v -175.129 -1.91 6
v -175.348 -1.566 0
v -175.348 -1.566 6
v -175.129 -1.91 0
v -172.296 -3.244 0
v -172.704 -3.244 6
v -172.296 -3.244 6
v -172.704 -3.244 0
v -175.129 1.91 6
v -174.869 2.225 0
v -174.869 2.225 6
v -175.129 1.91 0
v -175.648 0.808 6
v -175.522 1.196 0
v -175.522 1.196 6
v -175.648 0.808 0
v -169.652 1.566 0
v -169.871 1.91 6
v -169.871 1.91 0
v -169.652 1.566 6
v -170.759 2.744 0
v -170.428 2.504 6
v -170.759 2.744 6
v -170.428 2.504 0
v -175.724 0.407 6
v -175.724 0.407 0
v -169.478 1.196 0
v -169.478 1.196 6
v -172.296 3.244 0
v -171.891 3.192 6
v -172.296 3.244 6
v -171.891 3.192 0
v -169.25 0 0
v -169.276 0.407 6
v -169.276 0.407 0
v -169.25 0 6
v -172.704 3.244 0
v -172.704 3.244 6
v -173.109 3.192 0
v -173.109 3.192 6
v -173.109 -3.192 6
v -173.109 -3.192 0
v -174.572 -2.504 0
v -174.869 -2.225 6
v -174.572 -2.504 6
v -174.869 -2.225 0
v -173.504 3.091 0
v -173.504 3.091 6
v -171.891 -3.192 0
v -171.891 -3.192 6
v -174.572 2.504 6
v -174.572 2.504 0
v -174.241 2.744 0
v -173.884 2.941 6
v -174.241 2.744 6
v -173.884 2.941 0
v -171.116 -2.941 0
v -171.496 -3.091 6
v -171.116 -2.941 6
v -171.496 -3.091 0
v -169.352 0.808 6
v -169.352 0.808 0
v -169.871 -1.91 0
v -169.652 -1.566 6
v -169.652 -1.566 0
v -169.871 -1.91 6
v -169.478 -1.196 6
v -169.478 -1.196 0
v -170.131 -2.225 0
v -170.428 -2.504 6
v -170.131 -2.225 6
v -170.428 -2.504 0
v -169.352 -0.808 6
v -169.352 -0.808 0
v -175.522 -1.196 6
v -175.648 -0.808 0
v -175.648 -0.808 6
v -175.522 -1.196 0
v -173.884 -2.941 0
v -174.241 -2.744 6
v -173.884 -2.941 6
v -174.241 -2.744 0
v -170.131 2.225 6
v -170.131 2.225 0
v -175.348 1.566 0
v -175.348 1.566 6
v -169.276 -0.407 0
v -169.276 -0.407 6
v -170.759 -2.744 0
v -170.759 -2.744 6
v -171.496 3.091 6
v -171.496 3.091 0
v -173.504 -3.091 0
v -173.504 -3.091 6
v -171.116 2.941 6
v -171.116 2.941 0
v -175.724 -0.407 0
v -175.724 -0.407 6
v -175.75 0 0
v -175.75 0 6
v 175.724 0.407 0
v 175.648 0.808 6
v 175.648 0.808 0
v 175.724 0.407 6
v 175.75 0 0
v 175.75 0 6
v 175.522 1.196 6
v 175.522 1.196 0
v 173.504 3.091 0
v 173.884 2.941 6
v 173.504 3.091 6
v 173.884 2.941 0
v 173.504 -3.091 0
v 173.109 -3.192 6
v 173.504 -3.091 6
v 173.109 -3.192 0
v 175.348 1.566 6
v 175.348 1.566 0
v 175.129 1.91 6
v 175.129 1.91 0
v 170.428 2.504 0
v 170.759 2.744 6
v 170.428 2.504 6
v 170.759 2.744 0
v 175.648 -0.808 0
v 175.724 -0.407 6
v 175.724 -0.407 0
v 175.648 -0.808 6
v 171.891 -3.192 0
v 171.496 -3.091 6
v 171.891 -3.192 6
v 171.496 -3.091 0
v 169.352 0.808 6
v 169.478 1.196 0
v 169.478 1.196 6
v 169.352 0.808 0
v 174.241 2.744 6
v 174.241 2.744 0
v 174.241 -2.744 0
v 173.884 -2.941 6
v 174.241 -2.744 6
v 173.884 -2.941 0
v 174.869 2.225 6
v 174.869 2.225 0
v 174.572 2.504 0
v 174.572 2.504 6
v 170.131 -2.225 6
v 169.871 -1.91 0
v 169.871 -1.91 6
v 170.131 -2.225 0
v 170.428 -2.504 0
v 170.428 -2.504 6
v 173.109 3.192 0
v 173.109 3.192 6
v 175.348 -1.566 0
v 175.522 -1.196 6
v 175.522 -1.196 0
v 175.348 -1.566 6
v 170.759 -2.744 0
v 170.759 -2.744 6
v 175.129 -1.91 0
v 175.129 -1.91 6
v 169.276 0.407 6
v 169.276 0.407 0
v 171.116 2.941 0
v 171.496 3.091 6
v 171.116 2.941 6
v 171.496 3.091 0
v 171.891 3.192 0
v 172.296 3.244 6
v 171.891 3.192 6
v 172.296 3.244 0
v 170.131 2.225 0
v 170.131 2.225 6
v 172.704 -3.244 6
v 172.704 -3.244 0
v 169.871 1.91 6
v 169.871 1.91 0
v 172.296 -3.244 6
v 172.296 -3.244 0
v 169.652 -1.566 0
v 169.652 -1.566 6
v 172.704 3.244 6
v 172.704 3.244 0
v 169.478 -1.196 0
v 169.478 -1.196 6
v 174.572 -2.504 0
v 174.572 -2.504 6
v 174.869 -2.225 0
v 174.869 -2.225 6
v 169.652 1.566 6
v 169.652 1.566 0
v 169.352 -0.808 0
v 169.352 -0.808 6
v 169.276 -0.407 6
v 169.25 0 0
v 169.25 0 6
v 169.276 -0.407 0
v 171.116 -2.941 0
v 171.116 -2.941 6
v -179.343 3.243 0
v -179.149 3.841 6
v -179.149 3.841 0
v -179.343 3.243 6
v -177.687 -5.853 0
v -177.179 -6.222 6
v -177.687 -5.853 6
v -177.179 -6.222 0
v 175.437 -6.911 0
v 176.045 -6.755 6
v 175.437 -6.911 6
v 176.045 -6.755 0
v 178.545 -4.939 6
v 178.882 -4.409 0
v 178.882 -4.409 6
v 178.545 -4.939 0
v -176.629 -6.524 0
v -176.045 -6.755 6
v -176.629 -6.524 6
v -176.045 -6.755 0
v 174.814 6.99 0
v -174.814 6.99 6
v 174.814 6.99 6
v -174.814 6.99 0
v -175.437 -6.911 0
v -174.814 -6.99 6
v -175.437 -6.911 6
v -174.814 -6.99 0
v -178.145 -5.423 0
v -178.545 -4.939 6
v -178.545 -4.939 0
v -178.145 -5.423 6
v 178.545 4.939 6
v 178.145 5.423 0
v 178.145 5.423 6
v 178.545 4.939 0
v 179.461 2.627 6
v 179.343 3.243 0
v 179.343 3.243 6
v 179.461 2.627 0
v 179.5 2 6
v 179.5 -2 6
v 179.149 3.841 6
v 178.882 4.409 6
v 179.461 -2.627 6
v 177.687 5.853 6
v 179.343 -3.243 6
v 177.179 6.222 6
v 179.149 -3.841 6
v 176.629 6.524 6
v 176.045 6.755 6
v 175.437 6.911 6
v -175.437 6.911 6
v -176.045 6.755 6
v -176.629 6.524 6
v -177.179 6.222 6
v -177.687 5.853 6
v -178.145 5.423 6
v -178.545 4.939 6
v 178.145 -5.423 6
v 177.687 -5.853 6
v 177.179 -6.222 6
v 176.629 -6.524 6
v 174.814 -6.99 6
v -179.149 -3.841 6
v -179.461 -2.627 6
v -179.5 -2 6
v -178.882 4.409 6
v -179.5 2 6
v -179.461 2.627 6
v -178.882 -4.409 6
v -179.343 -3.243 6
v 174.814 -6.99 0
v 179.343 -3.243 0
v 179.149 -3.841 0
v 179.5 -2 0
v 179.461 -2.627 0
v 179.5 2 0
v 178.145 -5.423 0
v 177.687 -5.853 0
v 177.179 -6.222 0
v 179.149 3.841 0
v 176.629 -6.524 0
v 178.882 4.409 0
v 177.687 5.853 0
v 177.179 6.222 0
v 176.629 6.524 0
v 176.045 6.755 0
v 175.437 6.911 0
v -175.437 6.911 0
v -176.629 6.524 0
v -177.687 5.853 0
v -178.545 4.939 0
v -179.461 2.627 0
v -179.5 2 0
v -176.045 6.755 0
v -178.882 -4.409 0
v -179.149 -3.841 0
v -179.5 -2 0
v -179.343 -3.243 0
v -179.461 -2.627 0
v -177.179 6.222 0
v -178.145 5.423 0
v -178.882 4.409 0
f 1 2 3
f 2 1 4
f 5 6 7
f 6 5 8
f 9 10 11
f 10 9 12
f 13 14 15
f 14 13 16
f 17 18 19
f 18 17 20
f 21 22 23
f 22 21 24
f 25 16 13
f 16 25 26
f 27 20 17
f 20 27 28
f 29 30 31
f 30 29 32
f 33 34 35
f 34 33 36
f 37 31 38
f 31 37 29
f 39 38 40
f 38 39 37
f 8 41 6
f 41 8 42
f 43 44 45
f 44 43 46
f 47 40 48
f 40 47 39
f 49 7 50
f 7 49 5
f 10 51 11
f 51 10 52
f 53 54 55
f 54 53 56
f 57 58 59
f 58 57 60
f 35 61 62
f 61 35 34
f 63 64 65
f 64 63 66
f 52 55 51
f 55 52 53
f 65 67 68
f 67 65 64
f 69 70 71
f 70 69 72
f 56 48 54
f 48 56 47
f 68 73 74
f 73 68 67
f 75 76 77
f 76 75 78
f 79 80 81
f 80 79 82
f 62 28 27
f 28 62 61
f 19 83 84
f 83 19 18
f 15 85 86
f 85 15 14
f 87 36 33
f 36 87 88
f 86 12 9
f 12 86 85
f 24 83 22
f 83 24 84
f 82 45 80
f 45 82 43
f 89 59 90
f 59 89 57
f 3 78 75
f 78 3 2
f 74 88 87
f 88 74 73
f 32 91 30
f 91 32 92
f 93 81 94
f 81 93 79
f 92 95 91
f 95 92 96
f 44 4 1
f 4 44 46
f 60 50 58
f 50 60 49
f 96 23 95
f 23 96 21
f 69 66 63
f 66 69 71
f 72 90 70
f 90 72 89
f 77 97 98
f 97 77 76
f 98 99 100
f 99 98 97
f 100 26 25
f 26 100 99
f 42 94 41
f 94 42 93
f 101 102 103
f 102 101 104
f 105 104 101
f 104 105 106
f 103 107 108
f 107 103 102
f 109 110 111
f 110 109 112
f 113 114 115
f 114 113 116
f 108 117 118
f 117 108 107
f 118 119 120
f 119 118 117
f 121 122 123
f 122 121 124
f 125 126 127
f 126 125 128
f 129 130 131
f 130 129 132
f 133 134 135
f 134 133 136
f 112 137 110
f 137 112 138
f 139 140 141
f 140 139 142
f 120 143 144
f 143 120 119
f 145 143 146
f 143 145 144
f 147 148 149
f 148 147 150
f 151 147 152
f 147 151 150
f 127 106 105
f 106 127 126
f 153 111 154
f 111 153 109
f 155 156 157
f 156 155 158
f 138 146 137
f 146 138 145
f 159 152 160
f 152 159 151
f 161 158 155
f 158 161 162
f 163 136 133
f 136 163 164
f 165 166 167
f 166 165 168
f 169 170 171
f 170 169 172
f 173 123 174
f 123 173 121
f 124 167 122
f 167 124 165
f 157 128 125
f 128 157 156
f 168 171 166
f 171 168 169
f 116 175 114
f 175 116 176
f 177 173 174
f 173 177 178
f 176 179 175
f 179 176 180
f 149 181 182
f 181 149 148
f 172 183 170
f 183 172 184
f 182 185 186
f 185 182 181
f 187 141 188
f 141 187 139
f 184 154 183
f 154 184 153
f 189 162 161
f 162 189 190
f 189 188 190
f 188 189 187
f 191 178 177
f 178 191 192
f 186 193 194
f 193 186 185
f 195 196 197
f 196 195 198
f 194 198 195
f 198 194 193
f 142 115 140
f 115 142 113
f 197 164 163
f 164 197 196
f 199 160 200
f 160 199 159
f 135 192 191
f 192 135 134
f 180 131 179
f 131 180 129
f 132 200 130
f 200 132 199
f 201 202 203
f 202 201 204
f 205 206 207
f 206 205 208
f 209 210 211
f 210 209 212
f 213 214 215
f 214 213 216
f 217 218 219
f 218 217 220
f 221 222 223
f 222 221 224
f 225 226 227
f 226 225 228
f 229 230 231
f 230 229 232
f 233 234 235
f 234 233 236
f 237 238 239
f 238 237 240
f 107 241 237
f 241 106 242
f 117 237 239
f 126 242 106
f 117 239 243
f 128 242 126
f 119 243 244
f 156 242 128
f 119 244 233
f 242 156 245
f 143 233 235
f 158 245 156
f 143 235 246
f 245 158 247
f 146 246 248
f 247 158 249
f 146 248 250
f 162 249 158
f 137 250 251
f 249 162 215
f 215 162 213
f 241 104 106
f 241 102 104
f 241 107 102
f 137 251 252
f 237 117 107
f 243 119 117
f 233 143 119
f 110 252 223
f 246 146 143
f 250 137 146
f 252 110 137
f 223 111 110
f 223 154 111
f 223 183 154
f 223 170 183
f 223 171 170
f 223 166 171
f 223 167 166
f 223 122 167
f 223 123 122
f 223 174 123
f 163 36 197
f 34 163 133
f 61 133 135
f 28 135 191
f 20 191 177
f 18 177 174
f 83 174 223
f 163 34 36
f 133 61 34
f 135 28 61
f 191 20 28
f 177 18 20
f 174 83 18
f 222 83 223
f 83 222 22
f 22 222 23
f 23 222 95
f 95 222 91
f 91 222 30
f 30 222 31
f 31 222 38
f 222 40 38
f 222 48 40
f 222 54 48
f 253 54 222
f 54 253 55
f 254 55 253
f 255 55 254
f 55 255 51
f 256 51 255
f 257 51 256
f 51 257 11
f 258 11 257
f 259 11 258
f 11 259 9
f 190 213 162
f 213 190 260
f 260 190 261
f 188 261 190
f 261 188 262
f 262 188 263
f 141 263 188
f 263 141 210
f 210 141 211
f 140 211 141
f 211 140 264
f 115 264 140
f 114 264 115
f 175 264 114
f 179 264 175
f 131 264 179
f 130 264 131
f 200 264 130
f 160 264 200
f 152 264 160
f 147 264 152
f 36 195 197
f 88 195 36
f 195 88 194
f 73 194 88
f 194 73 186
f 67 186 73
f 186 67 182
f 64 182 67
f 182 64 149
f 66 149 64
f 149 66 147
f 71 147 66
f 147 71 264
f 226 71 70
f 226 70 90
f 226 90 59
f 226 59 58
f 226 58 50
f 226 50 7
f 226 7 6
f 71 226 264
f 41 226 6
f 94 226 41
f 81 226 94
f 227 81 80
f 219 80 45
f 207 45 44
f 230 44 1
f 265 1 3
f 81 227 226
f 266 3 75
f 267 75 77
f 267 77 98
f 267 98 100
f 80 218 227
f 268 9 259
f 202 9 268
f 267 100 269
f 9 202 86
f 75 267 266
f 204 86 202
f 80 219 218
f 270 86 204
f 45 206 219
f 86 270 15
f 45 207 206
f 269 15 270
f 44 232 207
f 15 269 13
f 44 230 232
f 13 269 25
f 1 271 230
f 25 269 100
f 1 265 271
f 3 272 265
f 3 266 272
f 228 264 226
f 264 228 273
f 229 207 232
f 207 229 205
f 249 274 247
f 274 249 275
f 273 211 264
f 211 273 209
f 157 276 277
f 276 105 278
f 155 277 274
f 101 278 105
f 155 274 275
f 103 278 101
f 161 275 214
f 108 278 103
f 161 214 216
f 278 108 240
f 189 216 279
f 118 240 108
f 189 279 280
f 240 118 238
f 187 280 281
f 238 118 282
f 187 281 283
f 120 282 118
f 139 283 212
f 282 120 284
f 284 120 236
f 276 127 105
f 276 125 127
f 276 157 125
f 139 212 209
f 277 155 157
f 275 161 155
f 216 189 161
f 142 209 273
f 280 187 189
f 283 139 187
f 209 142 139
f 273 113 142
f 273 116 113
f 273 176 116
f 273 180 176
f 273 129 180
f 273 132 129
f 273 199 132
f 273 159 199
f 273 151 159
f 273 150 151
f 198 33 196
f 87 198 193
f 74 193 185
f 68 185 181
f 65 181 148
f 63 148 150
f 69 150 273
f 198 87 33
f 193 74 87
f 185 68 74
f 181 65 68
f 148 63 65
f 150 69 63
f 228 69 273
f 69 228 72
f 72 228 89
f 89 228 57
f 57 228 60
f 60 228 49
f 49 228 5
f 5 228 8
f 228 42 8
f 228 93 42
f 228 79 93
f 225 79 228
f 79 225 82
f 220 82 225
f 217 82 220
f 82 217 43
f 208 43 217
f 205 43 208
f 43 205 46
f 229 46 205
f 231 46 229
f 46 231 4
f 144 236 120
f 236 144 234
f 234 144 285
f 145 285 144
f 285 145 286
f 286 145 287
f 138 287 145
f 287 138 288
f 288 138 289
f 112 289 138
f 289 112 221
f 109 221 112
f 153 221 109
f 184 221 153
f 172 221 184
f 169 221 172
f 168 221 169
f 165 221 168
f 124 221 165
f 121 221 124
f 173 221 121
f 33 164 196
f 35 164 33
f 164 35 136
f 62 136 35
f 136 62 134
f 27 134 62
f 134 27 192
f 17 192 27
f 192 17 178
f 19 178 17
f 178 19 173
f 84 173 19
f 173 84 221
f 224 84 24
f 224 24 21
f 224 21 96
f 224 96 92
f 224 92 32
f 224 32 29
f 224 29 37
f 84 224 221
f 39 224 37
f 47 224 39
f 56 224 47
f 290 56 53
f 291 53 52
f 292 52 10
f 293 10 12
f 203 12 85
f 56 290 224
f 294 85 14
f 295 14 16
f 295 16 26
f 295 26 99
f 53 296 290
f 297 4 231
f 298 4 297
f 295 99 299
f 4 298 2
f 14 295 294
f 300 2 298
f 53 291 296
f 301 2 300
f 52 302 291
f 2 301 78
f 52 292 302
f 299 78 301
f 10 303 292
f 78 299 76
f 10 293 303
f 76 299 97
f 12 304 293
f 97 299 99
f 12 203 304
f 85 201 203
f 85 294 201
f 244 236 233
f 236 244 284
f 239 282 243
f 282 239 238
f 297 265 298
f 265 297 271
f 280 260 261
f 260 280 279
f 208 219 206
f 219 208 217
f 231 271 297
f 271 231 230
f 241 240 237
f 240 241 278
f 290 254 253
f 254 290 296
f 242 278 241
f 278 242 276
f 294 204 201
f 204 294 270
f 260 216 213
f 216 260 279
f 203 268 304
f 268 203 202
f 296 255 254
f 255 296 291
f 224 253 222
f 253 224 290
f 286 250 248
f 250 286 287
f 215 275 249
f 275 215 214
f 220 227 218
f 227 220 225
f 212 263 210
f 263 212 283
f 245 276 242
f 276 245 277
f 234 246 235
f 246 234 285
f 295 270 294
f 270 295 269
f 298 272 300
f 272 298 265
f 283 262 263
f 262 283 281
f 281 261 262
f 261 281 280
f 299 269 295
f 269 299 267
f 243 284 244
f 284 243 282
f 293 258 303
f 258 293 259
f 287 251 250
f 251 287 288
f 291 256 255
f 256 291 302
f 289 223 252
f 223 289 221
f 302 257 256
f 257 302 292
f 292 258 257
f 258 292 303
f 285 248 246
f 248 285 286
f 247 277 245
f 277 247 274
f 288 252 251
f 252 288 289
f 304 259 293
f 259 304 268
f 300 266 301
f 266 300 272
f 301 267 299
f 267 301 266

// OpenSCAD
$fn = 50;


difference() {
	union() {
		hull() {
			translate(v = [-174.5000000000, 2.0000000000, 0]) {
				cylinder(h = 6, r = 5);
			}
			translate(v = [174.5000000000, 2.0000000000, 0]) {
				cylinder(h = 6, r = 5);
			}
			translate(v = [-174.5000000000, -2.0000000000, 0]) {
				cylinder(h = 6, r = 5);
			}
			translate(v = [174.5000000000, -2.0000000000, 0]) {
				cylinder(h = 6, r = 5);
			}
		}
	}
	union() {
		translate(v = [-172.5000000000, 0.0000000000, -100.0000000000]) {
			cylinder(h = 200, r = 3.2500000000);
		}
		translate(v = [-172.5000000000, 0.0000000000, -100.0000000000]) {
			cylinder(h = 200, r = 3.2500000000);
		}
		translate(v = [172.5000000000, 0.0000000000, -100.0000000000]) {
			cylinder(h = 200, r = 3.2500000000);
		}
		translate(v = [172.5000000000, 0.0000000000, -100.0000000000]) {
			cylinder(h = 200, r = 3.2500000000);
		}
	}
}
